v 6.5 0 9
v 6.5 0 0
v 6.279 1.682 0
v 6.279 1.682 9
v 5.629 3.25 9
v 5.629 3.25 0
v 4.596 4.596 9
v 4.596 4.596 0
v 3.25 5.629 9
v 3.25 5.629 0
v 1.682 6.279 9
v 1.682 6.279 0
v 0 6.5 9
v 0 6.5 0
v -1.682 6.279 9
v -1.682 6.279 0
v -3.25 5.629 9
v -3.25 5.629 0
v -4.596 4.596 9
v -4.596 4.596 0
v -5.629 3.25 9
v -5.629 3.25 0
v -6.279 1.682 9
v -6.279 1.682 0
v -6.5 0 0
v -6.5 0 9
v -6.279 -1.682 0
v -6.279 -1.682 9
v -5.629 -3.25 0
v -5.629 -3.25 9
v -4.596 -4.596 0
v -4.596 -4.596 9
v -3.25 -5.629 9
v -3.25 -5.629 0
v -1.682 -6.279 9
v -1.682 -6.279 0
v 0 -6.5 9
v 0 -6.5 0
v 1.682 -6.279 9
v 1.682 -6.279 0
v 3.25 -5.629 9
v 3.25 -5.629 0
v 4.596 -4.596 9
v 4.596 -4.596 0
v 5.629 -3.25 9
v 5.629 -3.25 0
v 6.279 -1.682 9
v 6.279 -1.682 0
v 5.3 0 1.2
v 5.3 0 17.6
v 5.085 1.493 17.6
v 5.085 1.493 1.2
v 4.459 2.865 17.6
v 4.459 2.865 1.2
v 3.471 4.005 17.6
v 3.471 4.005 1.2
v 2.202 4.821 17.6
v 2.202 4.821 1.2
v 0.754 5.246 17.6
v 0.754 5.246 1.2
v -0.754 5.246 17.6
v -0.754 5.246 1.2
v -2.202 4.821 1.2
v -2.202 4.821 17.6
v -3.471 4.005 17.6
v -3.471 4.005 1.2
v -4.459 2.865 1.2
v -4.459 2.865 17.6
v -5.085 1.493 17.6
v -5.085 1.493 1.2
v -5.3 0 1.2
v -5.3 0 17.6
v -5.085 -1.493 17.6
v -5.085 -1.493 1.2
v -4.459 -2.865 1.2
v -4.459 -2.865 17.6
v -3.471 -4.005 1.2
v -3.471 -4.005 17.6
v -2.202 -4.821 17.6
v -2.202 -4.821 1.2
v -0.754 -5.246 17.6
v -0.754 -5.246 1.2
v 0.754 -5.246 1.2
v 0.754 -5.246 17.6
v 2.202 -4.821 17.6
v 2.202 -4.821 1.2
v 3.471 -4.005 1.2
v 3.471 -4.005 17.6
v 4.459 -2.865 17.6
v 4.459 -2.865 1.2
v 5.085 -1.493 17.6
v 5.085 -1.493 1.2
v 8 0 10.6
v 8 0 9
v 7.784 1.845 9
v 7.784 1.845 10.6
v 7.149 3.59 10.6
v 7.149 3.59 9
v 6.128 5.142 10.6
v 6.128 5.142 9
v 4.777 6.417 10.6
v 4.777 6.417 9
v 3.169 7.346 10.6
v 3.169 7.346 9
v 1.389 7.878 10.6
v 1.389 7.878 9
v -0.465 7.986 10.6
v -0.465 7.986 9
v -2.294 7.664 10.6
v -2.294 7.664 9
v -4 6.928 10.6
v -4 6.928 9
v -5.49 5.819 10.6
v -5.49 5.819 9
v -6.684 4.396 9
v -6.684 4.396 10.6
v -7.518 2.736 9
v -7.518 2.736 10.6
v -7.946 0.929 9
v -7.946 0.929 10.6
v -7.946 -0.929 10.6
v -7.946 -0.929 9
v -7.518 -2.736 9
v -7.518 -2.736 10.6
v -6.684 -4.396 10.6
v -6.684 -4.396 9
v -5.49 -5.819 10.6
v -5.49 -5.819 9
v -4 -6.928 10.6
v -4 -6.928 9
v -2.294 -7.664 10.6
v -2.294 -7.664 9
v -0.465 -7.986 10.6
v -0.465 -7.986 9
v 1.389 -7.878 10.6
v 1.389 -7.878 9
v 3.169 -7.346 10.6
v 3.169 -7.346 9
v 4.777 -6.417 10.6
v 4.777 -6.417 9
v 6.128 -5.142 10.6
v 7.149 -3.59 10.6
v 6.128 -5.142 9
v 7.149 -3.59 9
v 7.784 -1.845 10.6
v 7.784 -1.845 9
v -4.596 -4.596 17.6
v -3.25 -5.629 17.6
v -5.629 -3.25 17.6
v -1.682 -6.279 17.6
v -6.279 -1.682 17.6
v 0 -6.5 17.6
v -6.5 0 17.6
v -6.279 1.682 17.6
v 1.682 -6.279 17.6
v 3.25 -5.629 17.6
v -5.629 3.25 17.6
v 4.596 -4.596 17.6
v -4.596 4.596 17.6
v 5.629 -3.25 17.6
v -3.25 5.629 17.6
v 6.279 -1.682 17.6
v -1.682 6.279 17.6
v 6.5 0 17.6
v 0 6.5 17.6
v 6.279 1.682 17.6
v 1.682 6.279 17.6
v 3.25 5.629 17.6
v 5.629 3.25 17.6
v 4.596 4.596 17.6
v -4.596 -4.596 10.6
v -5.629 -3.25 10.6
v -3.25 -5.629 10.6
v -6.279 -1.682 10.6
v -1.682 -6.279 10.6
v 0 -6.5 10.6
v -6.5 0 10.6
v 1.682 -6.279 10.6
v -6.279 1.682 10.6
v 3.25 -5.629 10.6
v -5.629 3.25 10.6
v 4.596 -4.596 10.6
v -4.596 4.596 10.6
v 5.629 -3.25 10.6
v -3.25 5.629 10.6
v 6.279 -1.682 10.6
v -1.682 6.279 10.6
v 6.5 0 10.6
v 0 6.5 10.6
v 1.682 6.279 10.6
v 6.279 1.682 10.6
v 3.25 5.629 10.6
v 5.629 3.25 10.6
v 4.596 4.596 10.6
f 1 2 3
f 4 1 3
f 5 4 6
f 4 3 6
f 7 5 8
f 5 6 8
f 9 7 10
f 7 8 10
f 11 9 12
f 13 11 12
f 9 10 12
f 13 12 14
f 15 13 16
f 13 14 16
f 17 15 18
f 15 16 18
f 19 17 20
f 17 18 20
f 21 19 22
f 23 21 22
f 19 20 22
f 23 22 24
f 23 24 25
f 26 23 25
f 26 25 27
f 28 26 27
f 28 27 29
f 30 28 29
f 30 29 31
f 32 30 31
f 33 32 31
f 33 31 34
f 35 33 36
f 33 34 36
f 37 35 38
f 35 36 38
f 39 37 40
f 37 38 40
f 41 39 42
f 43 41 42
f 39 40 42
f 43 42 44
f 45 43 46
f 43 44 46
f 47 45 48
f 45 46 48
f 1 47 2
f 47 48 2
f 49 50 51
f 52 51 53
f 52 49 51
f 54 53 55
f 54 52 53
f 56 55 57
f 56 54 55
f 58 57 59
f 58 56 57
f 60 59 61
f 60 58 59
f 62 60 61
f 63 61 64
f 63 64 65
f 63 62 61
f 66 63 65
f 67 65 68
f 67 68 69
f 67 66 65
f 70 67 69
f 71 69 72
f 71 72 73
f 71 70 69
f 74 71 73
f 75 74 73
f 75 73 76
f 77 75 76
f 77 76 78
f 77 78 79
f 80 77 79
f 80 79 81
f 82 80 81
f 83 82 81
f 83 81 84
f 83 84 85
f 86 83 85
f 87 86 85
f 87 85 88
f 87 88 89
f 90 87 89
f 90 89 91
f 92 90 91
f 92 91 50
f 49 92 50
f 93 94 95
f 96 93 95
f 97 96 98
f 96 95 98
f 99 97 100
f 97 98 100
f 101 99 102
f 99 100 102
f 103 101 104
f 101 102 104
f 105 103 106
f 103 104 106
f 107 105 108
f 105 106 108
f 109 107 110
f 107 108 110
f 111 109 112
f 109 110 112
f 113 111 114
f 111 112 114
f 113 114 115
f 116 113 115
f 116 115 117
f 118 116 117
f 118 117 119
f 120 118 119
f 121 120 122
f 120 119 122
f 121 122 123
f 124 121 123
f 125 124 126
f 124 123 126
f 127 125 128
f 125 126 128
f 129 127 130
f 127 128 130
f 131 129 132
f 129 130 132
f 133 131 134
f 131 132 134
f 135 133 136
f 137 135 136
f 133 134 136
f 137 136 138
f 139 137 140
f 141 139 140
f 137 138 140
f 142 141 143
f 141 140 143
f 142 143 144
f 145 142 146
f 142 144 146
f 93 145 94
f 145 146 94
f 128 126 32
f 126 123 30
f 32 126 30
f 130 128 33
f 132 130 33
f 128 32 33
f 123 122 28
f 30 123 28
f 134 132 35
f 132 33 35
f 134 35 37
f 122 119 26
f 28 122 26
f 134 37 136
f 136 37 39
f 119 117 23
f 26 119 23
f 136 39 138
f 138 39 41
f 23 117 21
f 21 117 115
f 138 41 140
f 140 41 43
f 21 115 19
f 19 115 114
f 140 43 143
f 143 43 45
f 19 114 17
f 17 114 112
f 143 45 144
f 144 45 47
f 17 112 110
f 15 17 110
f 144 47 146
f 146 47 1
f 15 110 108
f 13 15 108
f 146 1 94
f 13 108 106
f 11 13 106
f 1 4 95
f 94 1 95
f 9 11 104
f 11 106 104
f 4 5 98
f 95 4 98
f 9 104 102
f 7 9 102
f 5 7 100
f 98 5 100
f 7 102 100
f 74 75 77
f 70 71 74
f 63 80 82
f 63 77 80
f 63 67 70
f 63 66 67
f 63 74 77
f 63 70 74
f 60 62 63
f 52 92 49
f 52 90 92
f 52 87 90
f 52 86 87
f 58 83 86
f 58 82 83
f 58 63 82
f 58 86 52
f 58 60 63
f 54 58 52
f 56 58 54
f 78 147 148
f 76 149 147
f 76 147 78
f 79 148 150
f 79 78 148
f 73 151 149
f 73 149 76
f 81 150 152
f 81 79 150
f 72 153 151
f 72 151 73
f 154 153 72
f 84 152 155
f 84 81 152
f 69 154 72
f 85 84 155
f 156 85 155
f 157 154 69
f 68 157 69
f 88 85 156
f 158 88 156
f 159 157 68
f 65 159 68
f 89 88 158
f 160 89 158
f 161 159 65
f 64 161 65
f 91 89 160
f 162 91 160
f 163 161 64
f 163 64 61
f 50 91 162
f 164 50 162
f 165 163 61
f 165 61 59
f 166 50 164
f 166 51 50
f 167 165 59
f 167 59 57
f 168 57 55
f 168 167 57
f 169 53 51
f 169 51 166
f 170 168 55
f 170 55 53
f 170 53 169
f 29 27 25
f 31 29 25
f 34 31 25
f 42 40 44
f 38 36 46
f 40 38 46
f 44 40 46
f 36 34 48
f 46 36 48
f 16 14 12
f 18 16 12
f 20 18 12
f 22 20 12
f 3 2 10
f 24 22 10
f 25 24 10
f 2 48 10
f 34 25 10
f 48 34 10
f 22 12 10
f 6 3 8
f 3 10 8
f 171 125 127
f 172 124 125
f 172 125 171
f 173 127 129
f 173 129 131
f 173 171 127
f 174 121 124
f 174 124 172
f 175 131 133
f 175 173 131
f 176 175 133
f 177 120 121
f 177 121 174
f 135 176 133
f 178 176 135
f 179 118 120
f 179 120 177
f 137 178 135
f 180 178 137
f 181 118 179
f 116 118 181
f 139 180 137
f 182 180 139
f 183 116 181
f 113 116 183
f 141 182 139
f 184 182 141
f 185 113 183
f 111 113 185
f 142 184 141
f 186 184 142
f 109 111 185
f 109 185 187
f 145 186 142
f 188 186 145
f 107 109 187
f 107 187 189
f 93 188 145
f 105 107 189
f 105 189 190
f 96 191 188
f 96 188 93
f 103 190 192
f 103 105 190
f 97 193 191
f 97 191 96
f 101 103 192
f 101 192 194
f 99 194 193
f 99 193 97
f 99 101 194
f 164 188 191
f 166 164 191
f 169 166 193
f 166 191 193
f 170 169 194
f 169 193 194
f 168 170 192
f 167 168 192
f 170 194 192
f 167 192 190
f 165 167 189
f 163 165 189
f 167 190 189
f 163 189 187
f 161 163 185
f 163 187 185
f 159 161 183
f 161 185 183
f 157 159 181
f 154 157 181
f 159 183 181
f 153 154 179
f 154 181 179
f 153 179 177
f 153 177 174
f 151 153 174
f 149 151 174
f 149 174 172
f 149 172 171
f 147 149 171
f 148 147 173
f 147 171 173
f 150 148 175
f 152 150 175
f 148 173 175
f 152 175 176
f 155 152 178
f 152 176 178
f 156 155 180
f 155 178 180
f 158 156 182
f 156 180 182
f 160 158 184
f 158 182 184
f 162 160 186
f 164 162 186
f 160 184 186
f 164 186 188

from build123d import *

# Parameters (mm, degrees)
F0_R     = 6.5
F1_DEPTH = 9
F2_R     = 8
F3_DEPTH = 1.6
F4_R     = 6.5
F5_DEPTH = 7
F6_T     = 1.2


# Not quite as in the source:
# - a shell that OpenCascade refuses in one call is made with other operations: the cavity is built on its own and cut out


with BuildPart() as f1:
    # F0 (on Top) → F1 (new body)
    with BuildSketch(Plane.XY):
        Circle(F0_R)
    extrude(amount=F1_DEPTH)

    # F2 (on face) → F3 (join)
    with BuildSketch(Plane.XY.offset(9)):
        Circle(F2_R)
    extrude(amount=F3_DEPTH)

    # F4 (on face) → F5 (join)
    with BuildSketch(Plane.XY.offset(10.6)):
        Circle(F4_R)
    extrude(amount=F5_DEPTH)

    # F6: shell of thickness 1.2, made by hand


with BuildPart() as f6_core1:
    # F6_t2: copy of F1
    add(f1.part)

    # the walls: a layer under each face that stays
    f6_faces = [f6_core1.faces().sort_by_distance(p)[0] for p in [
        (-8, 0, 9.8),
        (-5.3333333333, -5.3333333333, 9),
        (-5.3333333333, -5.3333333333, 10.6),
        (-6.5, 0, 4.5),
        (-6.5, 0, 14.1),
        (0, 0, 0),
    ]]
    thicken(f6_faces, amount=-F6_T, mode=Mode.SUBTRACT)

    # F6_s3 → F6_t4 (revolve, cut)
    with BuildSketch(Plane.XZ):
        Polygon((6.512, 8.988), (6.5, 10.2), (5.3, 10.2), (5.3, 9), align=None)
    revolve(axis=Axis((0, 0, 9), (0, 0, 1)), mode=Mode.SUBTRACT)

    # F6_s5 → F6_t6 (revolve, cut)
    with BuildSketch(Plane.XZ):
        Polygon((6.512, 10.612), (6.5, 9.4), (5.3, 9.4), (5.3, 10.6), align=None)
    revolve(axis=Axis((0, 0, 10.6), (0, 0, 1)), mode=Mode.SUBTRACT)


with BuildPart() as f1_1:
    add(f1.part)

    # what is left inside the walls is the cavity
    f6_cavity = [f6_core1.part.solids().sort_by_distance(p)[0] for p in [
        (-5.288, 0, 12.133333),
    ]]
    add(f6_cavity, mode=Mode.SUBTRACT)


solid = f1_1.part
